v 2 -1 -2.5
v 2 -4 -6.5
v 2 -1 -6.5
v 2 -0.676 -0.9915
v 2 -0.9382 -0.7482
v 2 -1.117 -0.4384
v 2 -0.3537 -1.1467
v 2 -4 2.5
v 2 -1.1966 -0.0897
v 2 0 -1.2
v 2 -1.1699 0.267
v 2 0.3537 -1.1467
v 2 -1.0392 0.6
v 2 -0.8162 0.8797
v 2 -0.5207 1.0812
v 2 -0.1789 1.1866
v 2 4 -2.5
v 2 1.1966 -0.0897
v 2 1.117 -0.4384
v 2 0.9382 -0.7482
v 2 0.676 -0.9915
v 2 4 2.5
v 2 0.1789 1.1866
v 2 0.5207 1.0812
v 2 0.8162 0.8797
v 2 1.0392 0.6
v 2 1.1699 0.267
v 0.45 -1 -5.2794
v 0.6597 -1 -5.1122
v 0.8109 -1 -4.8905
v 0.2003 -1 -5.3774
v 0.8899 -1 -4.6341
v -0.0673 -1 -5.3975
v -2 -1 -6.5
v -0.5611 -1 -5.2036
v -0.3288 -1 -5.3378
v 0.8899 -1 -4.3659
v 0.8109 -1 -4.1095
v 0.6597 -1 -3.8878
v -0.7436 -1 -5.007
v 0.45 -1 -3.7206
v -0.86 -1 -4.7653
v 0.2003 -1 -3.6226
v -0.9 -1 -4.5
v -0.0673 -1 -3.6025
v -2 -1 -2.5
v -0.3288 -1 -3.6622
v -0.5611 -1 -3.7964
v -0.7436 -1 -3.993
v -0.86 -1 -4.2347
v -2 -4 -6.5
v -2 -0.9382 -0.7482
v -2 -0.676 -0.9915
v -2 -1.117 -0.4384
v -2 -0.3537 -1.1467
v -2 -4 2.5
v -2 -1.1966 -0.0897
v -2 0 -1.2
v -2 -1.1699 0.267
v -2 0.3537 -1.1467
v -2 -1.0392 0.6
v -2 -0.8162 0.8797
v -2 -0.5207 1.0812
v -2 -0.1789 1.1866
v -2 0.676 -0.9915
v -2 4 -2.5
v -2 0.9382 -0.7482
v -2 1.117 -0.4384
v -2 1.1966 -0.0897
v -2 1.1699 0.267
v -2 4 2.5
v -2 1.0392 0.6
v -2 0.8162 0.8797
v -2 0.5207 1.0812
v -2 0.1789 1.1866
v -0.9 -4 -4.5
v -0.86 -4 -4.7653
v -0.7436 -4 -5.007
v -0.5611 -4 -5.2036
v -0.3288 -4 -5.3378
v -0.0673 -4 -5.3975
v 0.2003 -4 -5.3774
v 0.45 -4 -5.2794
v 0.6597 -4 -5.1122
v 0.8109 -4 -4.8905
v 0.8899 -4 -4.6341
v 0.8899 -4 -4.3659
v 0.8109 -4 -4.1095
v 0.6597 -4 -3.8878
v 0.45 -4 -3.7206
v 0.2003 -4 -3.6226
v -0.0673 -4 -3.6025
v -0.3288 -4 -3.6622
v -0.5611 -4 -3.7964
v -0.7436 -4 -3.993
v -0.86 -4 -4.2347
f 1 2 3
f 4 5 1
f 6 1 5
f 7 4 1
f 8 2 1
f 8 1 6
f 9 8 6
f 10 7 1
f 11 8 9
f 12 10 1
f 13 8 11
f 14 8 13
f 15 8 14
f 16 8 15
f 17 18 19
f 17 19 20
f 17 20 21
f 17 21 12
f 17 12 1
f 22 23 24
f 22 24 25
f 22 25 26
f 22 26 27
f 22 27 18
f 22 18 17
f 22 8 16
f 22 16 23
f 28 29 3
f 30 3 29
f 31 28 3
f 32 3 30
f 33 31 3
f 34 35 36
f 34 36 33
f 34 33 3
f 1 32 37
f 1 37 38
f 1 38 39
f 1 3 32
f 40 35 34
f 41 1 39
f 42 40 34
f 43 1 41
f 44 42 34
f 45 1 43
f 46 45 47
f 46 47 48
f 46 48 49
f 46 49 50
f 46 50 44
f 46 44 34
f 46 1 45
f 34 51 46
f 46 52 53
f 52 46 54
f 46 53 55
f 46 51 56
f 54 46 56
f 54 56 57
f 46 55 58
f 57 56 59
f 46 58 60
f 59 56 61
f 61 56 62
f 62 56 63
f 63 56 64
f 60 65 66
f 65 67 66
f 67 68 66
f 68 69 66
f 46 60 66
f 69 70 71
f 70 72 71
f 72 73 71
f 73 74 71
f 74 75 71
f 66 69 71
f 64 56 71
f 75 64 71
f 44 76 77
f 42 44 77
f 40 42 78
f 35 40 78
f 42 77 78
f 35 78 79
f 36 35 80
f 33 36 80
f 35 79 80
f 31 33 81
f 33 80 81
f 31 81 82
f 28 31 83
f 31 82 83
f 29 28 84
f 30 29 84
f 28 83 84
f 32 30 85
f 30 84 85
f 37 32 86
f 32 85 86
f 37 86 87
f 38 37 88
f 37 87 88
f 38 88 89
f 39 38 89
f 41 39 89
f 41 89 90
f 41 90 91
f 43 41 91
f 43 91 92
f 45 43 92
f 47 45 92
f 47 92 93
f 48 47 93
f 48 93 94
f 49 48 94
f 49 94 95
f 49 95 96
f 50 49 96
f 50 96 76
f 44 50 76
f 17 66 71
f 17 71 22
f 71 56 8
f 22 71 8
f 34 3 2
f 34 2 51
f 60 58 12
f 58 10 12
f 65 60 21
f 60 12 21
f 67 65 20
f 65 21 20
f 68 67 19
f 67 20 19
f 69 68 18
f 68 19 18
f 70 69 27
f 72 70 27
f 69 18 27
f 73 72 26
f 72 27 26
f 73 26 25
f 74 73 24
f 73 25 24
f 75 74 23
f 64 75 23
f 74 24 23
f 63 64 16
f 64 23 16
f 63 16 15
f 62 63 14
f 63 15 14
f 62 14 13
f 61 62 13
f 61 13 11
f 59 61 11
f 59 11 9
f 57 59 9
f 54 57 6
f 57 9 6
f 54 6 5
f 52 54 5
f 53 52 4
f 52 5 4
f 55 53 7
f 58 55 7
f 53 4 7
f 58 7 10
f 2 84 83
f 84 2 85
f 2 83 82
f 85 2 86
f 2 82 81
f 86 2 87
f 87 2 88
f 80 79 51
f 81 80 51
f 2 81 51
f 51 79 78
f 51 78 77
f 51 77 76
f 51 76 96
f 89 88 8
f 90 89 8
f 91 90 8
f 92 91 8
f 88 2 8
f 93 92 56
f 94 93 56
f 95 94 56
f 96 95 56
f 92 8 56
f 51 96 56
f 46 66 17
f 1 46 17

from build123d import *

# Parameters (mm, degrees)
SKETCH1_W                  = 4
SKETCH1_H                  = 5
BOSS_EXTRUDE1_DEPTH        = 4
SKETCH2_W                  = 4
SKETCH2_H                  = 3
BOSS_EXTRUDE2_DEPTH        = 4
M1_6_CLEARANCE_HOLE1_D     = 1.8
M1_6_CLEARANCE_HOLE1_DEPTH = 4
M1_6_CLEARANCE_HOLE1_TIP   = 0.540774557
M2_CLEARANCE_HOLE1_D       = 2.4
M2_CLEARANCE_HOLE1_DEPTH   = 4
M2_CLEARANCE_HOLE1_TIP     = 0.721032743


with BuildPart() as part:
    # Sketch1 → Boss-Extrude1 (new, symmetric)
    with BuildSketch(Plane(origin=(0, 0, 0), x_dir=(1, 0, 0), z_dir=(0, 1, 0))):
        Rectangle(SKETCH1_W, SKETCH1_H)
    extrude(amount=BOSS_EXTRUDE1_DEPTH, both=True)

    # Sketch2 → Boss-Extrude2 (add)
    with BuildSketch(Plane(origin=(0, 0, -2.5), x_dir=(-1, 0, 0), z_dir=(0, 0, -1))):
        with Locations((0, -2.5)):
            Rectangle(SKETCH2_W, SKETCH2_H)
    extrude(amount=BOSS_EXTRUDE2_DEPTH)

    # M1.6 Clearance Hole1
    with Locations(Plane(origin=(0, -1, 0), x_dir=(1, 0, 0), z_dir=(0, 1, 0))):
        with Locations((0, 4.5)):
            Hole(M1_6_CLEARANCE_HOLE1_D / 2, depth=M1_6_CLEARANCE_HOLE1_DEPTH)
            with Locations((0, 0, -(M1_6_CLEARANCE_HOLE1_DEPTH + M1_6_CLEARANCE_HOLE1_TIP / 2))):  # 118° drill point
                Cone(0, M1_6_CLEARANCE_HOLE1_D / 2, M1_6_CLEARANCE_HOLE1_TIP, mode=Mode.SUBTRACT)

    # M2 Clearance Hole1
    with Locations(Plane.ZY.offset(2)):
        with Locations((0, 0)):
            Hole(M2_CLEARANCE_HOLE1_D / 2, depth=M2_CLEARANCE_HOLE1_DEPTH)
            with Locations((0, 0, -(M2_CLEARANCE_HOLE1_DEPTH + M2_CLEARANCE_HOLE1_TIP / 2))):  # 118° drill point
                Cone(0, M2_CLEARANCE_HOLE1_D / 2, M2_CLEARANCE_HOLE1_TIP, mode=Mode.SUBTRACT)


solid = part.part
